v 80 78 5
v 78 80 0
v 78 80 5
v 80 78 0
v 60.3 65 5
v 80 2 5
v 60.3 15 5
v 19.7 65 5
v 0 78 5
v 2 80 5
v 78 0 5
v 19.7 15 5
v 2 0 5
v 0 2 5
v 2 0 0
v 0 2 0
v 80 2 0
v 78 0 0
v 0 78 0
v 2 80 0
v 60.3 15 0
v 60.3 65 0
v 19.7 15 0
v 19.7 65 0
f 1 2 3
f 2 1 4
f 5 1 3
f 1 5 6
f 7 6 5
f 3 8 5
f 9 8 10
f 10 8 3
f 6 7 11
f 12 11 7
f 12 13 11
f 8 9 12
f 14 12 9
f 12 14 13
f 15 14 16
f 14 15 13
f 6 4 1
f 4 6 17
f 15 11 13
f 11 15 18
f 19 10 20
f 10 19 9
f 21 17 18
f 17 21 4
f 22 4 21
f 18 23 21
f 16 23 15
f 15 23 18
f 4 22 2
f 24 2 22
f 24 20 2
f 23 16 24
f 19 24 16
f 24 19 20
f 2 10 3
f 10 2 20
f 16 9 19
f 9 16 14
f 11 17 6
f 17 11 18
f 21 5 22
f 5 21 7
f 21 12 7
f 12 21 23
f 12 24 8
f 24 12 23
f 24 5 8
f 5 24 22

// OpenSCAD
$fn = 32;

// ----------------------------------------------------------------------
// Windowed plate: 1 voids, 80 x 80 x 5 mm
// ----------------------------------------------------------------------

// --- parameters (mm) ---
plate_l = 80;             // plate length, X
plate_w = 80;             // plate width, Y
plate_t = 5;              // plate thickness, Z
edge_margin = 12;         // wall from the plate edge to any window
win1_l = 40.6;            // window length
win1_w = 50;              // window width
depth_1 = 5;              // depth of void 1 (full thickness = through)
corner_c = 2;             // corner chamfer of the plate
fit_tol = 0.1;            // declared fit tolerance (prompt contract)
free_tol = 0.3;           // declared free tolerance (prompt contract)

profile = [[2, 0], [78, 0], [80, 2], [80, 78], [78, 80], [2, 80], [0, 78], [0, 2]];  // primary outline, 8 points, counter clockwise
void_1 = [[19.7, 15], [60.3, 15], [60.3, 65], [19.7, 65]];  // large central window, 4 points

// --- the one profile operation ---
difference() {
  linear_extrude(height = plate_t) polygon(points = profile);
  translate([0, 0, -1])
    linear_extrude(height = plate_t + 2) polygon(points = void_1);
}
